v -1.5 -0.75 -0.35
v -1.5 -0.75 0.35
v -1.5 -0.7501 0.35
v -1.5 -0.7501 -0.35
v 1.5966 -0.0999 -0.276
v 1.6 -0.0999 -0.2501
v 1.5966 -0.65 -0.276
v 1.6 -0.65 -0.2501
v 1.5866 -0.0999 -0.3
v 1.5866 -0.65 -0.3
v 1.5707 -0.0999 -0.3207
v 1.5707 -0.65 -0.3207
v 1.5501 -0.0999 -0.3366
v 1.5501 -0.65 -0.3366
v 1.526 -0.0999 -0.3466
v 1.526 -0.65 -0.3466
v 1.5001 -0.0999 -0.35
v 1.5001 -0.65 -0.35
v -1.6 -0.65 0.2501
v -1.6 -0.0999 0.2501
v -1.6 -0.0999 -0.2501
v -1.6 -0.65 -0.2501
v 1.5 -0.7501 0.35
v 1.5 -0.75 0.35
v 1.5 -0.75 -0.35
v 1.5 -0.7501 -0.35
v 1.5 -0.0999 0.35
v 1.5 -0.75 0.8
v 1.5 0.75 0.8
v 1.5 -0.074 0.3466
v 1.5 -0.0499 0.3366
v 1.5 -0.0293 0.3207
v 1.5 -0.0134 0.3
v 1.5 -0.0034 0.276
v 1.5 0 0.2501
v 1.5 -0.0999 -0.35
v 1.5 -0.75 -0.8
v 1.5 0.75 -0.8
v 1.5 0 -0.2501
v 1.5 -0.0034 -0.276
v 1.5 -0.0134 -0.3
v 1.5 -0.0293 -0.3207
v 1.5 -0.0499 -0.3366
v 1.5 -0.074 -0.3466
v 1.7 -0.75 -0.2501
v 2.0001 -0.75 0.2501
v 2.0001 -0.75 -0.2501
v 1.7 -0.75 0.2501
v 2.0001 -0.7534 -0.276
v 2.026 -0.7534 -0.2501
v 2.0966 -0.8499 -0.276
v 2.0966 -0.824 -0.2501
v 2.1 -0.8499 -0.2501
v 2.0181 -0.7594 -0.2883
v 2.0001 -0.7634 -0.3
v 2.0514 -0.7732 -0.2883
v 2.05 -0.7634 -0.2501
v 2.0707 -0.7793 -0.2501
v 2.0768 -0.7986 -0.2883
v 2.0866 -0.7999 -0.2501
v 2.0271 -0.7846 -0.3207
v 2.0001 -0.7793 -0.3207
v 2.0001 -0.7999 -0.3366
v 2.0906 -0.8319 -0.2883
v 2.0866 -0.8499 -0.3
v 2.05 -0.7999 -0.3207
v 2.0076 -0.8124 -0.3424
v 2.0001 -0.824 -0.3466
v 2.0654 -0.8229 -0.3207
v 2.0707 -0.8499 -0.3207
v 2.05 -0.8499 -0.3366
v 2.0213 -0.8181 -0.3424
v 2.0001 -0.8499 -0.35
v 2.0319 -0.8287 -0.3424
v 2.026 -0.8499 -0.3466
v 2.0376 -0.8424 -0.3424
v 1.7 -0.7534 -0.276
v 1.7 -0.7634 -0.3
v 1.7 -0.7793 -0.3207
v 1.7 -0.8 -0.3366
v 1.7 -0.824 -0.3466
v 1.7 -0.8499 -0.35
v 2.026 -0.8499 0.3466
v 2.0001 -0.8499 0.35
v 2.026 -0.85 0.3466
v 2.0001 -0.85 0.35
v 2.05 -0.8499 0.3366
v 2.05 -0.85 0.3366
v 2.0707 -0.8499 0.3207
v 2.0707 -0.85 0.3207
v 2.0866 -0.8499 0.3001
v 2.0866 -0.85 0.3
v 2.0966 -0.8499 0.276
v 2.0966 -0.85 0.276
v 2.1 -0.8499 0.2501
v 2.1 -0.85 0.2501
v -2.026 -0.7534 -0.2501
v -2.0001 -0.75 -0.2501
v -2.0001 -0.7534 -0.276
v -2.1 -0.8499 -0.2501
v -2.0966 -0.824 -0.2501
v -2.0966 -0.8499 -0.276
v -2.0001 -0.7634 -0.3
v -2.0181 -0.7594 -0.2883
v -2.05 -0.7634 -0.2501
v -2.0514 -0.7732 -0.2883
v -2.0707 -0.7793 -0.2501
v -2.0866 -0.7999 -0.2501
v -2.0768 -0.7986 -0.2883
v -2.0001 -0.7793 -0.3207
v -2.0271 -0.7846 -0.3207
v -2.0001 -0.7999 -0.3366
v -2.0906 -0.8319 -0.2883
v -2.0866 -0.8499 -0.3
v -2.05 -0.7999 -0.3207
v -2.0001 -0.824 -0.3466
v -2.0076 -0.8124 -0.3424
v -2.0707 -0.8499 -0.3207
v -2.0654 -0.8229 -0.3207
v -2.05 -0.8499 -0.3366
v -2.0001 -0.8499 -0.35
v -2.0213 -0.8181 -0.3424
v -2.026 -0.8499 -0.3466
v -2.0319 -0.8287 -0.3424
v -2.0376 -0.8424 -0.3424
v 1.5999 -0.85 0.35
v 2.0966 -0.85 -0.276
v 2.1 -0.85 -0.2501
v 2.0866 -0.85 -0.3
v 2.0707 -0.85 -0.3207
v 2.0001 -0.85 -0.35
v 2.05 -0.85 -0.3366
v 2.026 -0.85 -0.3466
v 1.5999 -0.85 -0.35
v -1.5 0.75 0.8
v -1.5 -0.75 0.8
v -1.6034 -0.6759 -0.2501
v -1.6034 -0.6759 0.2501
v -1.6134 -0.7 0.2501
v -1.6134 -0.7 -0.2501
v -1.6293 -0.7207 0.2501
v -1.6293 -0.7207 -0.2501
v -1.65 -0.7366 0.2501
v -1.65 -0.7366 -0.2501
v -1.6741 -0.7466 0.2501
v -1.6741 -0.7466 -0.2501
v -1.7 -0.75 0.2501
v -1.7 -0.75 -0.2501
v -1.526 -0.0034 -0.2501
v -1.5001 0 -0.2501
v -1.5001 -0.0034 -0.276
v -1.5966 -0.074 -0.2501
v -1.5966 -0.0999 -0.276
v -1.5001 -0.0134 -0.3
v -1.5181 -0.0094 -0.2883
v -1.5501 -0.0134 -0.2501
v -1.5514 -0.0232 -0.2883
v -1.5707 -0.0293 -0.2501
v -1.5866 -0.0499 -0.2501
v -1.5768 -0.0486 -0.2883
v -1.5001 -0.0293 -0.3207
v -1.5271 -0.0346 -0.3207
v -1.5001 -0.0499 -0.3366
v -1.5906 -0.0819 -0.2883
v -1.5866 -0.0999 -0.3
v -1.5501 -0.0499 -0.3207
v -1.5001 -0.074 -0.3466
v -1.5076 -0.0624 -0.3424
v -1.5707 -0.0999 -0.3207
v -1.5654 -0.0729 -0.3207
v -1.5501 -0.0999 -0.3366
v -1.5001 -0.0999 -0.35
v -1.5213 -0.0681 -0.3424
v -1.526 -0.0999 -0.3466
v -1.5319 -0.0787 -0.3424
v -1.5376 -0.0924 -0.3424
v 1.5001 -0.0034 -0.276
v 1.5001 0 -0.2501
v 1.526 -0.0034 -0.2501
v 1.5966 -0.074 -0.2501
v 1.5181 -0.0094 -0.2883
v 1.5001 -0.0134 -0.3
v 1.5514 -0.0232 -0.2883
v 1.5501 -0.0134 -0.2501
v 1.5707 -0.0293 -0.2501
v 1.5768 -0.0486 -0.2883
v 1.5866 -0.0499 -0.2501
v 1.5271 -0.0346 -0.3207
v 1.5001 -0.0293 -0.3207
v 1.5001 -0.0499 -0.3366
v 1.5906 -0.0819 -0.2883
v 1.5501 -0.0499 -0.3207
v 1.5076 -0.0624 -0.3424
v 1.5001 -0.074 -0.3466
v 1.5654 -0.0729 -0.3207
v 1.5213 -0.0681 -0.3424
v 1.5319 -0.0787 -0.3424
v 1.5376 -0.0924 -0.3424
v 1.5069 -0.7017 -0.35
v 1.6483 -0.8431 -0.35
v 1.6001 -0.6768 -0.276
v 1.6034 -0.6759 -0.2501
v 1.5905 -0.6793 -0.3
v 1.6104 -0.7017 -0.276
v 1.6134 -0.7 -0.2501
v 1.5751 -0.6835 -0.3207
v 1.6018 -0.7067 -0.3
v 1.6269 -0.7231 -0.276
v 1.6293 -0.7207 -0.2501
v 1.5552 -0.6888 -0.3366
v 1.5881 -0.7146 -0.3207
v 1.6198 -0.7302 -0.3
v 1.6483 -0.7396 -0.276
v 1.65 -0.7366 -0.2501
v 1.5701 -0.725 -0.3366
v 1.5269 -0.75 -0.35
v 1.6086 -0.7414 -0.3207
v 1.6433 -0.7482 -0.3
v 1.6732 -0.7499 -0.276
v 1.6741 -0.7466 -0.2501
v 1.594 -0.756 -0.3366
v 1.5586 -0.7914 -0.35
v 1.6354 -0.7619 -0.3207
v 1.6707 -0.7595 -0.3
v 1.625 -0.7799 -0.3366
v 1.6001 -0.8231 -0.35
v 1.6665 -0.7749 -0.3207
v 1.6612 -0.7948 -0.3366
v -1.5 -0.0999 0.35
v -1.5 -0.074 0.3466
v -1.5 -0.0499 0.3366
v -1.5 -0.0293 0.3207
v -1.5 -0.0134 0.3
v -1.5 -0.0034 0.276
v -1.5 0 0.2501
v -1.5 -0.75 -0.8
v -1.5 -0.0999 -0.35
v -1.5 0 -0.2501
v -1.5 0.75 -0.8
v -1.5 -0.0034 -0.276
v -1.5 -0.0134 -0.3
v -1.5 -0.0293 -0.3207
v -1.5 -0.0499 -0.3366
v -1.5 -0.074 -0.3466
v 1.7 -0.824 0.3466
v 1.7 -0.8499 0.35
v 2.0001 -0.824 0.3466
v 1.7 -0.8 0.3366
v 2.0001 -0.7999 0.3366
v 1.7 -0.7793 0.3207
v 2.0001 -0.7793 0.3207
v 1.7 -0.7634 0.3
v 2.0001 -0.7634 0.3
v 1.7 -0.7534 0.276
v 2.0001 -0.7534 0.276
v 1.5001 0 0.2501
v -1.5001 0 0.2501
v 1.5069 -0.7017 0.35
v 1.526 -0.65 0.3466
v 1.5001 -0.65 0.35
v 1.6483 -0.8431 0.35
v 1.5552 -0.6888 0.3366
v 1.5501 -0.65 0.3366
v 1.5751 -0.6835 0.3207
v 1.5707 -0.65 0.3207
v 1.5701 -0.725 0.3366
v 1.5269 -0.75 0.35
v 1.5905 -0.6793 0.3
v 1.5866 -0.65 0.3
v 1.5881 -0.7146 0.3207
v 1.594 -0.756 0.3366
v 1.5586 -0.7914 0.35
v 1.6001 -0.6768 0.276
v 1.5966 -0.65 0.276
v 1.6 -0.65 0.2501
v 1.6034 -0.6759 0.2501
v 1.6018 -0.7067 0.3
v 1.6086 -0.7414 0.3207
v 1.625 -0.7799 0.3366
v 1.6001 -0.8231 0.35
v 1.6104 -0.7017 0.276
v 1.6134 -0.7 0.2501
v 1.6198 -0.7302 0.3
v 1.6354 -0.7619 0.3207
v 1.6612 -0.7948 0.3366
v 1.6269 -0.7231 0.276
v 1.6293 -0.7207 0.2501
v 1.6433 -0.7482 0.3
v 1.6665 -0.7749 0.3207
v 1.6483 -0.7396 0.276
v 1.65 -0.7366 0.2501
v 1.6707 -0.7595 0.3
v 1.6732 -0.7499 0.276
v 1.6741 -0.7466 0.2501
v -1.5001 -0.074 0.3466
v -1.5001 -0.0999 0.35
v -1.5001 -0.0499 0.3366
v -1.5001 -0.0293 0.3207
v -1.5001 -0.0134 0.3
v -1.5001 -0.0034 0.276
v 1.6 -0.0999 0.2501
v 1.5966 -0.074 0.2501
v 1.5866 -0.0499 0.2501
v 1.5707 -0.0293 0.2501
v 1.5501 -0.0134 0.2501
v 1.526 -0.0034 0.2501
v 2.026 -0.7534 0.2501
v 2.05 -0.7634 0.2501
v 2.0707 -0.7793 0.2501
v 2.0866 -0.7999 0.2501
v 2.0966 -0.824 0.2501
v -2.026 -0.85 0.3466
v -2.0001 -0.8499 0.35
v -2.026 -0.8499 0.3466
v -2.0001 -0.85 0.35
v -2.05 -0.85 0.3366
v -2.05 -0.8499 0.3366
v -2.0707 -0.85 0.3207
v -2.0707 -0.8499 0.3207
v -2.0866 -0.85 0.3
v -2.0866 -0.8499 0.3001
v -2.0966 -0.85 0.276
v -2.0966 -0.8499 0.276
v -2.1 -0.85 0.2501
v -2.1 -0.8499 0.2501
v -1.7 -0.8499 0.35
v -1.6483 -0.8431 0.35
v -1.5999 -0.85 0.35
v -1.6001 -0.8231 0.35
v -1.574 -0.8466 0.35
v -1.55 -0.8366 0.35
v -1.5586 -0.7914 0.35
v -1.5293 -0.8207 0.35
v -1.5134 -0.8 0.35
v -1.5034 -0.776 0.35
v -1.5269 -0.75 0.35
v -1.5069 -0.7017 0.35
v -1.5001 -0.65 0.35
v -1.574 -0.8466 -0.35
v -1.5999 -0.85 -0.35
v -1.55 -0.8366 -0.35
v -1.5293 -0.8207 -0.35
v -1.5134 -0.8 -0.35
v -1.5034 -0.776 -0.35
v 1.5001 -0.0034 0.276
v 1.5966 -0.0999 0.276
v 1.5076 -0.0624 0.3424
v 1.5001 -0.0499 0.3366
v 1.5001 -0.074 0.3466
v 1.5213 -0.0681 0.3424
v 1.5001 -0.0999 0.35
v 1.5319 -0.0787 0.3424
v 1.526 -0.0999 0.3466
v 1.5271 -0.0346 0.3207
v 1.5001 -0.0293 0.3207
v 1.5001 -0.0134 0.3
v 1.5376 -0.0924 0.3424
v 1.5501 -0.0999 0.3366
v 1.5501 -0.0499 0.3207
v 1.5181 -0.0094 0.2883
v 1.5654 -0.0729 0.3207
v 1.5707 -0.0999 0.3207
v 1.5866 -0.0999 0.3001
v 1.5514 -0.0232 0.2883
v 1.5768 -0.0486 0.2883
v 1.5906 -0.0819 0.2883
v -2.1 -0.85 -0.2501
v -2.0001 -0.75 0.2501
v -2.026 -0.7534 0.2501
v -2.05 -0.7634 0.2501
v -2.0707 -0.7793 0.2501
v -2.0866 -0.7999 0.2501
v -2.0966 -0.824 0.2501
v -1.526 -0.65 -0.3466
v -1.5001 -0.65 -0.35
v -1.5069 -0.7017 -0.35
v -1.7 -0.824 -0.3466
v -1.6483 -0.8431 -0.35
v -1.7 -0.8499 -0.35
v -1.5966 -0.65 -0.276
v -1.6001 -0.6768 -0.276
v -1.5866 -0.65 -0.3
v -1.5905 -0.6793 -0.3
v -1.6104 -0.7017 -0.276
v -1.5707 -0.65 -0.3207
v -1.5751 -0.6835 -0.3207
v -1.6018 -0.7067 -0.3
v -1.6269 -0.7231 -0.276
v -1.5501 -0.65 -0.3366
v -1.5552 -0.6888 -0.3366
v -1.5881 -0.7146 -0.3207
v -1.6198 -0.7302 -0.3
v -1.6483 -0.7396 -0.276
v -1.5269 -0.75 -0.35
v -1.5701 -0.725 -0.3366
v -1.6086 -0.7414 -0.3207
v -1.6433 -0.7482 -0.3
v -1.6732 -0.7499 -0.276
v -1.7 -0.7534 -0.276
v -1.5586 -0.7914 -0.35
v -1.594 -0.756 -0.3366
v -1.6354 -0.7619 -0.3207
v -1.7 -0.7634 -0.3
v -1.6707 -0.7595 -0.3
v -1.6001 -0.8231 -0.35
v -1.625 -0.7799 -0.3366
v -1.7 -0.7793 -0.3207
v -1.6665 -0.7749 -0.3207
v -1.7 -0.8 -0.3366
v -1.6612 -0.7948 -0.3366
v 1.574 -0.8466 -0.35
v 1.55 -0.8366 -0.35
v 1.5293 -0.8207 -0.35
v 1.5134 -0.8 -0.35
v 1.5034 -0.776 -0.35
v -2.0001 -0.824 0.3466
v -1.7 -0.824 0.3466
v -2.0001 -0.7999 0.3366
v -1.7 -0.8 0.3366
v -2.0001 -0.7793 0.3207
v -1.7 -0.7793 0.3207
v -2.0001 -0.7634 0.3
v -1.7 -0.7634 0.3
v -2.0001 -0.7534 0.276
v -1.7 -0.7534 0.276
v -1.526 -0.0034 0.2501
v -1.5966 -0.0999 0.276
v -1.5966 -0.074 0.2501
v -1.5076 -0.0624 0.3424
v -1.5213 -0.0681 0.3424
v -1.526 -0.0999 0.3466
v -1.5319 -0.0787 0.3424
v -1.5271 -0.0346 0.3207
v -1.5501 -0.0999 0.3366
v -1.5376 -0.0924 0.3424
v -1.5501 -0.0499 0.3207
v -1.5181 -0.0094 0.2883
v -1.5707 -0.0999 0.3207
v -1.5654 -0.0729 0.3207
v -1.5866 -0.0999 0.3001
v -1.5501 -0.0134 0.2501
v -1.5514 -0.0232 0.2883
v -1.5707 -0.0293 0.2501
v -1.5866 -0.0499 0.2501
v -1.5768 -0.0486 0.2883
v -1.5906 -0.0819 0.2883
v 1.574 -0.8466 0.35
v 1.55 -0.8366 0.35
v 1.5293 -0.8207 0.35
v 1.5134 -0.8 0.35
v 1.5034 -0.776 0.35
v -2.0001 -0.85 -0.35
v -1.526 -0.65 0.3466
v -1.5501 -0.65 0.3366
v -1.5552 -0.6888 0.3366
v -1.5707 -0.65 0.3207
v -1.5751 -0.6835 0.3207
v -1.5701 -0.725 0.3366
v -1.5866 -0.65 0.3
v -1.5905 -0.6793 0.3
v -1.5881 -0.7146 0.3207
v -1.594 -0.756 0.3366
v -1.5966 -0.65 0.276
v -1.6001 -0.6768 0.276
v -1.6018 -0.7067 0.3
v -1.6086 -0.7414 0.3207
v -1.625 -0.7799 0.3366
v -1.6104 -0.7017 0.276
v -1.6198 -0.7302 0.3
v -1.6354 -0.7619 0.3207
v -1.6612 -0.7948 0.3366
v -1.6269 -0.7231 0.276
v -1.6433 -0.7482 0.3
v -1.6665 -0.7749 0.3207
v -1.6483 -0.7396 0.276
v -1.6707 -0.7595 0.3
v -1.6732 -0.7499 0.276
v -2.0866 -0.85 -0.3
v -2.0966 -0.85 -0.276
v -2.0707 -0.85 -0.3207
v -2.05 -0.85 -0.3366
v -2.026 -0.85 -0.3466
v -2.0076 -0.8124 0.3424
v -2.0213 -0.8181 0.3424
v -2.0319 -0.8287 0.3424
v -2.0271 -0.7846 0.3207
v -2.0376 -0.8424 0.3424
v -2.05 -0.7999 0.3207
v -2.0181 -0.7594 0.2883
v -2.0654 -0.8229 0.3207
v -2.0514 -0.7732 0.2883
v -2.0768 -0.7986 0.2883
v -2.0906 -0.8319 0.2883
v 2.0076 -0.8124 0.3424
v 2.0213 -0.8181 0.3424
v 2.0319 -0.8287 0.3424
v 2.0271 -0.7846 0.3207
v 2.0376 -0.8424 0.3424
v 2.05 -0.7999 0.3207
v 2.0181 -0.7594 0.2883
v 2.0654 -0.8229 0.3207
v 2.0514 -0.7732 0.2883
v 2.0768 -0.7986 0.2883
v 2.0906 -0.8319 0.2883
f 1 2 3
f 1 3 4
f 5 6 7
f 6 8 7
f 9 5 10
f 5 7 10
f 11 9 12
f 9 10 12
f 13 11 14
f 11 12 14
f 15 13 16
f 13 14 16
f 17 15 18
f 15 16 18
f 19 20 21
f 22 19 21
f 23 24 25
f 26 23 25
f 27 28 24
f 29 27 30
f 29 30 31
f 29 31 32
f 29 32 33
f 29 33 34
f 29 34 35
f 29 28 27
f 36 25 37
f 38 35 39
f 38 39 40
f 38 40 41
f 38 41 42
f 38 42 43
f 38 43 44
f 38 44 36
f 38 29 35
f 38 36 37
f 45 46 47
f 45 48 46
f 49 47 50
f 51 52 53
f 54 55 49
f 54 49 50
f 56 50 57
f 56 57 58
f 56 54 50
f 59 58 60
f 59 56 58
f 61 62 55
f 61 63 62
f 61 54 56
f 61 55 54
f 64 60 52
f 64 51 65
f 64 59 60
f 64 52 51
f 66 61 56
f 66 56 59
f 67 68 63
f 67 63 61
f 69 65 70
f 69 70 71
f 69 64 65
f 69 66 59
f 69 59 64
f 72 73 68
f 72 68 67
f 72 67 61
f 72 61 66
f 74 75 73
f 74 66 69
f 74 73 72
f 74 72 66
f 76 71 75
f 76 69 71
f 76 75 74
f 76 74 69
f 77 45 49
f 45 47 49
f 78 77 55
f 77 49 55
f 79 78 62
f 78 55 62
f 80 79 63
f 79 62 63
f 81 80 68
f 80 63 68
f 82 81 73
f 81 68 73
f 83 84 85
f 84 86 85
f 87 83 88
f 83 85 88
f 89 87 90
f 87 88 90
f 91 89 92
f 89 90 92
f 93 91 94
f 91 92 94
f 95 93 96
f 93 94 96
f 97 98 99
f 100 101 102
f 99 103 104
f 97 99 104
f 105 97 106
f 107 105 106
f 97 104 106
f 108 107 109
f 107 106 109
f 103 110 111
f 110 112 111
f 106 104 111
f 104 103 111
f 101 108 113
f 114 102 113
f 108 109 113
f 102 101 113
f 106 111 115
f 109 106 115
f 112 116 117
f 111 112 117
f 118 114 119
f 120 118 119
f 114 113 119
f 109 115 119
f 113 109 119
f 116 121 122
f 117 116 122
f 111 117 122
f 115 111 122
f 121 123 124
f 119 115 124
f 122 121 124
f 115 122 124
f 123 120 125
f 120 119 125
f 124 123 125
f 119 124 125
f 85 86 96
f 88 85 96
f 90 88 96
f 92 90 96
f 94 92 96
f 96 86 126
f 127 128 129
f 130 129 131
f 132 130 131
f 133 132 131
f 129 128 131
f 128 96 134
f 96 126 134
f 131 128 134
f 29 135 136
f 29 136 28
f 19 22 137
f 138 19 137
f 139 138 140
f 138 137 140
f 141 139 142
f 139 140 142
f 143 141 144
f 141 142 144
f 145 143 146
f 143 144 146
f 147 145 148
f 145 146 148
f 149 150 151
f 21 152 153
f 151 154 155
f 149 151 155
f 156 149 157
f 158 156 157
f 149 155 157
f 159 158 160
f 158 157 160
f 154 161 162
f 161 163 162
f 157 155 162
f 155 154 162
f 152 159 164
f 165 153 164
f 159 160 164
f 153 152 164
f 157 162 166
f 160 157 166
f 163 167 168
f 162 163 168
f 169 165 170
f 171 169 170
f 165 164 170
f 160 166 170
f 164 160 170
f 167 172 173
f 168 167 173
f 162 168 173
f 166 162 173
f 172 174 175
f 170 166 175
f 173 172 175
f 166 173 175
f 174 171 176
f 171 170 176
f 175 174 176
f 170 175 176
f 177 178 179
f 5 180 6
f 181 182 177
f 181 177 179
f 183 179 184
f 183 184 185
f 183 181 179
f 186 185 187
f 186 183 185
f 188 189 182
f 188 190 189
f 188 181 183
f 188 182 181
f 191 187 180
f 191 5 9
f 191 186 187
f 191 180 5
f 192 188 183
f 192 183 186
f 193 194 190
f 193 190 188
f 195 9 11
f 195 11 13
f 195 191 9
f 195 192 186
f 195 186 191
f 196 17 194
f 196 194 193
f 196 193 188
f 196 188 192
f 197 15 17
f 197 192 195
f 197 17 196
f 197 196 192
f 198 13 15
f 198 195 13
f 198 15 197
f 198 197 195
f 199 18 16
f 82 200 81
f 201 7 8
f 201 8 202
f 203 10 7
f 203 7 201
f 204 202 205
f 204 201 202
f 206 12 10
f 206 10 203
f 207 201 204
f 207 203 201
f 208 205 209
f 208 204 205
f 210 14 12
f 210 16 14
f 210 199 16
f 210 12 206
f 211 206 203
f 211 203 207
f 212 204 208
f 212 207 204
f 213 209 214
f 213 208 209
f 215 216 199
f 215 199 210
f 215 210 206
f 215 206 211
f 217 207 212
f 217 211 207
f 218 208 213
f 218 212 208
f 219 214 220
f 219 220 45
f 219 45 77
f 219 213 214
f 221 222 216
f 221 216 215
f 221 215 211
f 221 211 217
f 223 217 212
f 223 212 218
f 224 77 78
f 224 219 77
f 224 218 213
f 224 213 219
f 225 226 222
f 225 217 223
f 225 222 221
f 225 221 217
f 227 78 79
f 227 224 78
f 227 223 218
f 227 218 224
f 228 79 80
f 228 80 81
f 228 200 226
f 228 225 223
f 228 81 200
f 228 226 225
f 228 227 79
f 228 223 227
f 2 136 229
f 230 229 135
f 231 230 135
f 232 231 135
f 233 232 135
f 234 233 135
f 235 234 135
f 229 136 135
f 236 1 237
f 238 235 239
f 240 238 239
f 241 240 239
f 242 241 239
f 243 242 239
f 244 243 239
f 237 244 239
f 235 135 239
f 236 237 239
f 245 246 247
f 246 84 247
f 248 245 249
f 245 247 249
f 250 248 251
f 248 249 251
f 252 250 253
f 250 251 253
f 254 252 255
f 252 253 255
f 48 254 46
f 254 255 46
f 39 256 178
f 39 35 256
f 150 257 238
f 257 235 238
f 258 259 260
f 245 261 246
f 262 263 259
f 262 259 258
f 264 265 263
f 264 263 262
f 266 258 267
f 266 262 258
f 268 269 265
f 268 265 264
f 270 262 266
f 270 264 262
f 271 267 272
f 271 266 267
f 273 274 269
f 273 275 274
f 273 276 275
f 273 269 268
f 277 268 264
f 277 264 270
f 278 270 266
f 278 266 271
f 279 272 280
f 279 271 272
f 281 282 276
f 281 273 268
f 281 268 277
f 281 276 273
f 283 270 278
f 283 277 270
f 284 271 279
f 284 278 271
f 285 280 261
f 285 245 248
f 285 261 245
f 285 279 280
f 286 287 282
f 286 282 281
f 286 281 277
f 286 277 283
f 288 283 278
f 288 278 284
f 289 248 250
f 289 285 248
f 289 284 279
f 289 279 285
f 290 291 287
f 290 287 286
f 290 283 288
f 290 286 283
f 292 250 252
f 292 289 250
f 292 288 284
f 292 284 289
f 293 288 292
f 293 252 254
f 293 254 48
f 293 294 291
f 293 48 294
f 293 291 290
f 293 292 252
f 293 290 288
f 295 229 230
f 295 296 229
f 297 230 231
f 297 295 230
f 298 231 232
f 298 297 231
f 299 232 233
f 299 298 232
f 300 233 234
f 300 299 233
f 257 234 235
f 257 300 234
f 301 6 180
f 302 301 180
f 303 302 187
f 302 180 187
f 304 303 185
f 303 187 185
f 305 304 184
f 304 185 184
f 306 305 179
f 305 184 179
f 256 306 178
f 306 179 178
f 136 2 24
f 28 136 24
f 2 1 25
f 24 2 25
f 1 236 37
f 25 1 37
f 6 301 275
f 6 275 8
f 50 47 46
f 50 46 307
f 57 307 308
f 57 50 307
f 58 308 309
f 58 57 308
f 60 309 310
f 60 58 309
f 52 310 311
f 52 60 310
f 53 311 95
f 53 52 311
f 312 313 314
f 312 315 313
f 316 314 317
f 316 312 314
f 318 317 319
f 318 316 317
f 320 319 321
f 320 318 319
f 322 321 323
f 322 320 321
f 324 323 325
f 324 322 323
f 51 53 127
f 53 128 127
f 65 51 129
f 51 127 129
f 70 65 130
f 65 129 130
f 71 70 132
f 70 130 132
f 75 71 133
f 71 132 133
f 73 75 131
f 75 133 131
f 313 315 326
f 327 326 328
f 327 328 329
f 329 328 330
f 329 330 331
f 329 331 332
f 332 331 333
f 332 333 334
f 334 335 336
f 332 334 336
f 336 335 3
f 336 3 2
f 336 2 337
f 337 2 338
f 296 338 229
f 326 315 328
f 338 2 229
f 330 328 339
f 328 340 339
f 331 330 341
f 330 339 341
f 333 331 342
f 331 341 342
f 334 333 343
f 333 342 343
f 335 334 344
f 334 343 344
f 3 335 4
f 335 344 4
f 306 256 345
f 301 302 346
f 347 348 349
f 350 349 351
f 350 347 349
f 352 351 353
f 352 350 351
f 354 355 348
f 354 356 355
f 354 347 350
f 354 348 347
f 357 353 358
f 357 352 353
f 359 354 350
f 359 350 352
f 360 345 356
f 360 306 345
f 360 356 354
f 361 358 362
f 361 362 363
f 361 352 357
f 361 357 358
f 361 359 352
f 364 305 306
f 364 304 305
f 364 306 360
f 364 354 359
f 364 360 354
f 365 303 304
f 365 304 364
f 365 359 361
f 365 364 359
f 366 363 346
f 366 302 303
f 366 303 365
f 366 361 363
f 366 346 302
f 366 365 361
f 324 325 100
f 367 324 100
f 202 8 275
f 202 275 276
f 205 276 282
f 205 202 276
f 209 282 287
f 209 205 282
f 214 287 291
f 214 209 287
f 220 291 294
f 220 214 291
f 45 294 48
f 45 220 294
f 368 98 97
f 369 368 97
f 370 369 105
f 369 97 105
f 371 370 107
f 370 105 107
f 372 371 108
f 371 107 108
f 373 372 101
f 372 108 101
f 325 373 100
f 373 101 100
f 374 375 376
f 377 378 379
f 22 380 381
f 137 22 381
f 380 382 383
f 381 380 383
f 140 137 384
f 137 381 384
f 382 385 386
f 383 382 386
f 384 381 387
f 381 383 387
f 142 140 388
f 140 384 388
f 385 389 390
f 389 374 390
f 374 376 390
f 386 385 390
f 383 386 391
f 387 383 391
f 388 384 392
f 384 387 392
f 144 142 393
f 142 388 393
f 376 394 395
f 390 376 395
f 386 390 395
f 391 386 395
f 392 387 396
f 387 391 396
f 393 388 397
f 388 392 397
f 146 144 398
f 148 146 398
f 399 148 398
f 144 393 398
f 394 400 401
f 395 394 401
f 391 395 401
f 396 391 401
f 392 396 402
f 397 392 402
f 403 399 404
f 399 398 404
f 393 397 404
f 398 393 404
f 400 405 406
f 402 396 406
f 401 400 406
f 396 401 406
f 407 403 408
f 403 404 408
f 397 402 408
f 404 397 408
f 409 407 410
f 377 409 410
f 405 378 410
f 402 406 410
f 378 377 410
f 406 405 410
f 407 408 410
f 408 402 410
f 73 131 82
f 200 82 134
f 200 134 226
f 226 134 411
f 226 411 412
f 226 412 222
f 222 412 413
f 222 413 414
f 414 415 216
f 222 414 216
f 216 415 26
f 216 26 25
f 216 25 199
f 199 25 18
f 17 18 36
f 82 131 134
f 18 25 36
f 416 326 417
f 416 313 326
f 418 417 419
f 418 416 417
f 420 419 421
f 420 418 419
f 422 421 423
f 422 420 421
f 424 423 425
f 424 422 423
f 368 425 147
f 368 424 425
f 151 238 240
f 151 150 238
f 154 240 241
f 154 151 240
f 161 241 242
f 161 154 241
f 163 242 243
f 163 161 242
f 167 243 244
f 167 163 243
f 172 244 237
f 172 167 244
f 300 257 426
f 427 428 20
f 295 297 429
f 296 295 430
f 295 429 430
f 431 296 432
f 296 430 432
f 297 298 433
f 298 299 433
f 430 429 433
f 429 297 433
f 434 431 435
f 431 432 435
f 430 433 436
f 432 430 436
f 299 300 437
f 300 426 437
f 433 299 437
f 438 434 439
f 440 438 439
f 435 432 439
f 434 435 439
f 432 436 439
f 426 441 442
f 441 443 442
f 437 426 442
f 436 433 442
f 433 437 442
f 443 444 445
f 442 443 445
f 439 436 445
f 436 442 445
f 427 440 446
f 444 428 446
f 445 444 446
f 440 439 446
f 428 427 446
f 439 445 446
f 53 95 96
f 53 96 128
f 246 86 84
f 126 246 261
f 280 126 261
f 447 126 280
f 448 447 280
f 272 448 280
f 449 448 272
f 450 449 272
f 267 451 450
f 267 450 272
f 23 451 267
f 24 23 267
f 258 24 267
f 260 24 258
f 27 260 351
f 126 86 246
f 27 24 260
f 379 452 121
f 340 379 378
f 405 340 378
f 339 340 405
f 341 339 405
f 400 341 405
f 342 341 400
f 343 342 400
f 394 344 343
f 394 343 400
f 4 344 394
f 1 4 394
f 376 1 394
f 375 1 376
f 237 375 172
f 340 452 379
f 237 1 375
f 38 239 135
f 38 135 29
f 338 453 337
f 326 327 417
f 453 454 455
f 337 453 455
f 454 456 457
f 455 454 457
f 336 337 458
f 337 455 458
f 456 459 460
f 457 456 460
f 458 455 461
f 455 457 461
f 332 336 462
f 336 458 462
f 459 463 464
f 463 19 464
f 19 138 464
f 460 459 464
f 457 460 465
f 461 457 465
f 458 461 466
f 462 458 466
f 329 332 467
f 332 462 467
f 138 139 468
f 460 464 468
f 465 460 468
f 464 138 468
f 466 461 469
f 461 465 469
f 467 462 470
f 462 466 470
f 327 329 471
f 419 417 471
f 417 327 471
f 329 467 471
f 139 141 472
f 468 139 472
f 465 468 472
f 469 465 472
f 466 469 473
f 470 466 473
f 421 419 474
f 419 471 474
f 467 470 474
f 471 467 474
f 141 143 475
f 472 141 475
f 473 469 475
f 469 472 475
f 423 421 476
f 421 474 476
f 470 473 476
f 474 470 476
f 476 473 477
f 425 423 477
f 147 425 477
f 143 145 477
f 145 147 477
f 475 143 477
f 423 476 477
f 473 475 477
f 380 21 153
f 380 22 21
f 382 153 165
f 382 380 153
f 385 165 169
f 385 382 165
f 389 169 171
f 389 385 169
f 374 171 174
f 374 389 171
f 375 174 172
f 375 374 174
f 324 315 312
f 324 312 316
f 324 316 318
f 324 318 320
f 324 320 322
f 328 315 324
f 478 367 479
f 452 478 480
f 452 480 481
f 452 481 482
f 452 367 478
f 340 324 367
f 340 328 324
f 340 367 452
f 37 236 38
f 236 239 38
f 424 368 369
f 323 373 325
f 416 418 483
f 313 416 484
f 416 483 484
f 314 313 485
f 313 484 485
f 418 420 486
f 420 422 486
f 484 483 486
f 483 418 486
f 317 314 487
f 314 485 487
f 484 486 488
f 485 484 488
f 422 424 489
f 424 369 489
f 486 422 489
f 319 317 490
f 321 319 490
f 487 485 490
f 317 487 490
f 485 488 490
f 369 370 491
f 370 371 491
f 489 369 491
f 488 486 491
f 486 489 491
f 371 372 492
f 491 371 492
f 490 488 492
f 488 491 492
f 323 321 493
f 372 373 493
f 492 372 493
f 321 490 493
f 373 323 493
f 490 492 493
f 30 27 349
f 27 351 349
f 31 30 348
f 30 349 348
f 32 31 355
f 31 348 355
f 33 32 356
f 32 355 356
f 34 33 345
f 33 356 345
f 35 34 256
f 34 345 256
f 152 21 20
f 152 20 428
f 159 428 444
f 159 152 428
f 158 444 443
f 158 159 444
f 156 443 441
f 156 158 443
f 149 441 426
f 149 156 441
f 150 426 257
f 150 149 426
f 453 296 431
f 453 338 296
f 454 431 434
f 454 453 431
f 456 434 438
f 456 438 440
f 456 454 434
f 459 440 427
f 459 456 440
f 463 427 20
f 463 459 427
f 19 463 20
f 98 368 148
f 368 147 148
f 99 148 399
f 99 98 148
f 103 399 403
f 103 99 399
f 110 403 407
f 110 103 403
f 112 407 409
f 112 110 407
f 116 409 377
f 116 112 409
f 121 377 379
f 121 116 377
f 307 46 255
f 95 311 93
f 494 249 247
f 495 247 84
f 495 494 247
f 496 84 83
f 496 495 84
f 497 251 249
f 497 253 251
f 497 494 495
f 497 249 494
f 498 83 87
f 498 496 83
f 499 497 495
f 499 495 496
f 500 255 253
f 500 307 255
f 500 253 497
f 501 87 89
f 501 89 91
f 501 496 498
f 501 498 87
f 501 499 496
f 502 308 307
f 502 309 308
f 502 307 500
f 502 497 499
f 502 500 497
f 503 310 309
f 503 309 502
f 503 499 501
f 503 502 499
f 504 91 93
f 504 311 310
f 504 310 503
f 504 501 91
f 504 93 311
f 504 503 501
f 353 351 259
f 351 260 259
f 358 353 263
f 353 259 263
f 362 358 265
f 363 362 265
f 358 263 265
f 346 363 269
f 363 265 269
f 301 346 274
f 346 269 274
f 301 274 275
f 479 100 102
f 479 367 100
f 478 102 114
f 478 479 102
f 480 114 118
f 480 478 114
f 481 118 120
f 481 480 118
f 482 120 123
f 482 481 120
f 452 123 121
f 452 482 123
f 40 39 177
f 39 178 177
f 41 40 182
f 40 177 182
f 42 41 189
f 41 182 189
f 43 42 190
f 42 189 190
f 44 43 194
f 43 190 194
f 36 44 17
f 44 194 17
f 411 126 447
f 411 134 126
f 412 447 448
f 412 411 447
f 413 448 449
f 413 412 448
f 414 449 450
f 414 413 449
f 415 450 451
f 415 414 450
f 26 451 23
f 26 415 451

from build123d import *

# Parameters (mm, degrees)
SKETCH1_W            = 3
SKETCH1_H            = 1.6
BOSS_EXTRUDE1_DEPTH  = 0.75
SKETCH2_W            = 0.7
SKETCH2_H            = 0.85
BOSS_EXTRUDE2_DEPTH  = 0.1
SKETCH5_W            = 0.7
SKETCH5_H            = 0.1
BOSS_EXTRUDE4_DEPTH  = 0.5
FILLET4_R            = 0.1
FILLET4_OF_MIRROR1_R = 0.1


with BuildPart() as part:
    # Sketch1 → Boss-Extrude1 (new, symmetric)
    with BuildSketch(Plane(origin=(0, 0, 0), x_dir=(1, 0, 0), z_dir=(0, 1, 0))):
        Rectangle(SKETCH1_W, SKETCH1_H)
    extrude(amount=BOSS_EXTRUDE1_DEPTH, both=True)

    # Sketch2 → Boss-Extrude2 (add)
    with BuildSketch(Plane(origin=(1.5, 0, 0), x_dir=(0, 0, -1), z_dir=(1, 0, 0))):
        with Locations((0, -0.425)):
            Rectangle(SKETCH2_W, SKETCH2_H)
    boss_extrude2 = extrude(amount=BOSS_EXTRUDE2_DEPTH)

    # Sketch5 → Boss-Extrude4 (add)
    with BuildSketch(Plane(origin=(1.6, 0, 0), x_dir=(0, 0, -1), z_dir=(1, 0, 0))):
        with Locations((0, -0.8)):
            Rectangle(SKETCH5_W, SKETCH5_H)
    boss_extrude4 = extrude(amount=BOSS_EXTRUDE4_DEPTH)

    # Fillet4
    fillet4_edges = [part.edges().sort_by_distance(p)[0] for p in [
        (1.6, -0.75, 0),
    ]]
    fillet(fillet4_edges, radius=FILLET4_R)
    fillet4_2_edges = [part.edges().sort_by_distance(p)[0] for p in [
        (2.1, -0.75, 0),
        (1.6, 0, 0),
        (1.5, -0.85, 0),
    ]]
    fillet(fillet4_2_edges, radius=FILLET4_R - 0.0001)  # a hair under: the kernel refuses the full size
    fillet4_3_edges = [part.edges().sort_by_distance(p)[0] for p in [
        (1.85005, -0.75, -0.35),
        (1.85005, -0.75, 0.35),
        (1.6, -0.37495, -0.35),
        (1.6, -0.37495, 0.35),
        (1.570739967, -0.029260033, 0.35),
        (1.629289322, -0.720710678, 0.35),
        (1.629289322, -0.720710678, -0.35),
        (1.570739967, -0.029260033, -0.35),
        (2.070739967, -0.779260033, 0.35),
        (2.070739967, -0.779260033, -0.35),
    ]]
    fillet(fillet4_3_edges, radius=FILLET4_R - 0.0001)  # a hair under: the kernel refuses the full size

    # Mirror1: Boss-Extrude2, Boss-Extrude4 across plane
    add(boss_extrude2.mirror(Plane(origin=(0, 0, 0), x_dir=(0, 0, 1), z_dir=(1, 0, 0))))
    add(boss_extrude4.mirror(Plane(origin=(0, 0, 0), x_dir=(0, 0, 1), z_dir=(1, 0, 0))))

    # Fillet4 of Mirror1
    fillet4_of_mirror1_edges = [part.edges().sort_by_distance(p)[0] for p in [
        (-1.6, -0.75, 0),
    ]]
    fillet(fillet4_of_mirror1_edges, radius=FILLET4_OF_MIRROR1_R)
    fillet4_of_mirror1_2_edges = [part.edges().sort_by_distance(p)[0] for p in [
        (-2.1, -0.75, 0),
        (-1.6, 0, 0),
        (-1.5, -0.85, 0),
    ]]
    fillet(fillet4_of_mirror1_2_edges, radius=FILLET4_OF_MIRROR1_R - 0.0001)  # a hair under: the kernel refuses the full size
    fillet4_of_mirror1_3_edges = [part.edges().sort_by_distance(p)[0] for p in [
        (-1.85005, -0.75, -0.35),
        (-1.85005, -0.75, 0.35),
        (-1.6, -0.37495, -0.35),
        (-1.6, -0.37495, 0.35),
        (-1.570739967, -0.029260033, 0.35),
        (-1.629289322, -0.720710678, 0.35),
        (-1.629289322, -0.720710678, -0.35),
        (-1.570739967, -0.029260033, -0.35),
        (-2.070739967, -0.779260033, 0.35),
        (-2.070739967, -0.779260033, -0.35),
    ]]
    fillet(fillet4_of_mirror1_3_edges, radius=FILLET4_OF_MIRROR1_R - 0.0001)  # a hair under: the kernel refuses the full size


solid = part.part
